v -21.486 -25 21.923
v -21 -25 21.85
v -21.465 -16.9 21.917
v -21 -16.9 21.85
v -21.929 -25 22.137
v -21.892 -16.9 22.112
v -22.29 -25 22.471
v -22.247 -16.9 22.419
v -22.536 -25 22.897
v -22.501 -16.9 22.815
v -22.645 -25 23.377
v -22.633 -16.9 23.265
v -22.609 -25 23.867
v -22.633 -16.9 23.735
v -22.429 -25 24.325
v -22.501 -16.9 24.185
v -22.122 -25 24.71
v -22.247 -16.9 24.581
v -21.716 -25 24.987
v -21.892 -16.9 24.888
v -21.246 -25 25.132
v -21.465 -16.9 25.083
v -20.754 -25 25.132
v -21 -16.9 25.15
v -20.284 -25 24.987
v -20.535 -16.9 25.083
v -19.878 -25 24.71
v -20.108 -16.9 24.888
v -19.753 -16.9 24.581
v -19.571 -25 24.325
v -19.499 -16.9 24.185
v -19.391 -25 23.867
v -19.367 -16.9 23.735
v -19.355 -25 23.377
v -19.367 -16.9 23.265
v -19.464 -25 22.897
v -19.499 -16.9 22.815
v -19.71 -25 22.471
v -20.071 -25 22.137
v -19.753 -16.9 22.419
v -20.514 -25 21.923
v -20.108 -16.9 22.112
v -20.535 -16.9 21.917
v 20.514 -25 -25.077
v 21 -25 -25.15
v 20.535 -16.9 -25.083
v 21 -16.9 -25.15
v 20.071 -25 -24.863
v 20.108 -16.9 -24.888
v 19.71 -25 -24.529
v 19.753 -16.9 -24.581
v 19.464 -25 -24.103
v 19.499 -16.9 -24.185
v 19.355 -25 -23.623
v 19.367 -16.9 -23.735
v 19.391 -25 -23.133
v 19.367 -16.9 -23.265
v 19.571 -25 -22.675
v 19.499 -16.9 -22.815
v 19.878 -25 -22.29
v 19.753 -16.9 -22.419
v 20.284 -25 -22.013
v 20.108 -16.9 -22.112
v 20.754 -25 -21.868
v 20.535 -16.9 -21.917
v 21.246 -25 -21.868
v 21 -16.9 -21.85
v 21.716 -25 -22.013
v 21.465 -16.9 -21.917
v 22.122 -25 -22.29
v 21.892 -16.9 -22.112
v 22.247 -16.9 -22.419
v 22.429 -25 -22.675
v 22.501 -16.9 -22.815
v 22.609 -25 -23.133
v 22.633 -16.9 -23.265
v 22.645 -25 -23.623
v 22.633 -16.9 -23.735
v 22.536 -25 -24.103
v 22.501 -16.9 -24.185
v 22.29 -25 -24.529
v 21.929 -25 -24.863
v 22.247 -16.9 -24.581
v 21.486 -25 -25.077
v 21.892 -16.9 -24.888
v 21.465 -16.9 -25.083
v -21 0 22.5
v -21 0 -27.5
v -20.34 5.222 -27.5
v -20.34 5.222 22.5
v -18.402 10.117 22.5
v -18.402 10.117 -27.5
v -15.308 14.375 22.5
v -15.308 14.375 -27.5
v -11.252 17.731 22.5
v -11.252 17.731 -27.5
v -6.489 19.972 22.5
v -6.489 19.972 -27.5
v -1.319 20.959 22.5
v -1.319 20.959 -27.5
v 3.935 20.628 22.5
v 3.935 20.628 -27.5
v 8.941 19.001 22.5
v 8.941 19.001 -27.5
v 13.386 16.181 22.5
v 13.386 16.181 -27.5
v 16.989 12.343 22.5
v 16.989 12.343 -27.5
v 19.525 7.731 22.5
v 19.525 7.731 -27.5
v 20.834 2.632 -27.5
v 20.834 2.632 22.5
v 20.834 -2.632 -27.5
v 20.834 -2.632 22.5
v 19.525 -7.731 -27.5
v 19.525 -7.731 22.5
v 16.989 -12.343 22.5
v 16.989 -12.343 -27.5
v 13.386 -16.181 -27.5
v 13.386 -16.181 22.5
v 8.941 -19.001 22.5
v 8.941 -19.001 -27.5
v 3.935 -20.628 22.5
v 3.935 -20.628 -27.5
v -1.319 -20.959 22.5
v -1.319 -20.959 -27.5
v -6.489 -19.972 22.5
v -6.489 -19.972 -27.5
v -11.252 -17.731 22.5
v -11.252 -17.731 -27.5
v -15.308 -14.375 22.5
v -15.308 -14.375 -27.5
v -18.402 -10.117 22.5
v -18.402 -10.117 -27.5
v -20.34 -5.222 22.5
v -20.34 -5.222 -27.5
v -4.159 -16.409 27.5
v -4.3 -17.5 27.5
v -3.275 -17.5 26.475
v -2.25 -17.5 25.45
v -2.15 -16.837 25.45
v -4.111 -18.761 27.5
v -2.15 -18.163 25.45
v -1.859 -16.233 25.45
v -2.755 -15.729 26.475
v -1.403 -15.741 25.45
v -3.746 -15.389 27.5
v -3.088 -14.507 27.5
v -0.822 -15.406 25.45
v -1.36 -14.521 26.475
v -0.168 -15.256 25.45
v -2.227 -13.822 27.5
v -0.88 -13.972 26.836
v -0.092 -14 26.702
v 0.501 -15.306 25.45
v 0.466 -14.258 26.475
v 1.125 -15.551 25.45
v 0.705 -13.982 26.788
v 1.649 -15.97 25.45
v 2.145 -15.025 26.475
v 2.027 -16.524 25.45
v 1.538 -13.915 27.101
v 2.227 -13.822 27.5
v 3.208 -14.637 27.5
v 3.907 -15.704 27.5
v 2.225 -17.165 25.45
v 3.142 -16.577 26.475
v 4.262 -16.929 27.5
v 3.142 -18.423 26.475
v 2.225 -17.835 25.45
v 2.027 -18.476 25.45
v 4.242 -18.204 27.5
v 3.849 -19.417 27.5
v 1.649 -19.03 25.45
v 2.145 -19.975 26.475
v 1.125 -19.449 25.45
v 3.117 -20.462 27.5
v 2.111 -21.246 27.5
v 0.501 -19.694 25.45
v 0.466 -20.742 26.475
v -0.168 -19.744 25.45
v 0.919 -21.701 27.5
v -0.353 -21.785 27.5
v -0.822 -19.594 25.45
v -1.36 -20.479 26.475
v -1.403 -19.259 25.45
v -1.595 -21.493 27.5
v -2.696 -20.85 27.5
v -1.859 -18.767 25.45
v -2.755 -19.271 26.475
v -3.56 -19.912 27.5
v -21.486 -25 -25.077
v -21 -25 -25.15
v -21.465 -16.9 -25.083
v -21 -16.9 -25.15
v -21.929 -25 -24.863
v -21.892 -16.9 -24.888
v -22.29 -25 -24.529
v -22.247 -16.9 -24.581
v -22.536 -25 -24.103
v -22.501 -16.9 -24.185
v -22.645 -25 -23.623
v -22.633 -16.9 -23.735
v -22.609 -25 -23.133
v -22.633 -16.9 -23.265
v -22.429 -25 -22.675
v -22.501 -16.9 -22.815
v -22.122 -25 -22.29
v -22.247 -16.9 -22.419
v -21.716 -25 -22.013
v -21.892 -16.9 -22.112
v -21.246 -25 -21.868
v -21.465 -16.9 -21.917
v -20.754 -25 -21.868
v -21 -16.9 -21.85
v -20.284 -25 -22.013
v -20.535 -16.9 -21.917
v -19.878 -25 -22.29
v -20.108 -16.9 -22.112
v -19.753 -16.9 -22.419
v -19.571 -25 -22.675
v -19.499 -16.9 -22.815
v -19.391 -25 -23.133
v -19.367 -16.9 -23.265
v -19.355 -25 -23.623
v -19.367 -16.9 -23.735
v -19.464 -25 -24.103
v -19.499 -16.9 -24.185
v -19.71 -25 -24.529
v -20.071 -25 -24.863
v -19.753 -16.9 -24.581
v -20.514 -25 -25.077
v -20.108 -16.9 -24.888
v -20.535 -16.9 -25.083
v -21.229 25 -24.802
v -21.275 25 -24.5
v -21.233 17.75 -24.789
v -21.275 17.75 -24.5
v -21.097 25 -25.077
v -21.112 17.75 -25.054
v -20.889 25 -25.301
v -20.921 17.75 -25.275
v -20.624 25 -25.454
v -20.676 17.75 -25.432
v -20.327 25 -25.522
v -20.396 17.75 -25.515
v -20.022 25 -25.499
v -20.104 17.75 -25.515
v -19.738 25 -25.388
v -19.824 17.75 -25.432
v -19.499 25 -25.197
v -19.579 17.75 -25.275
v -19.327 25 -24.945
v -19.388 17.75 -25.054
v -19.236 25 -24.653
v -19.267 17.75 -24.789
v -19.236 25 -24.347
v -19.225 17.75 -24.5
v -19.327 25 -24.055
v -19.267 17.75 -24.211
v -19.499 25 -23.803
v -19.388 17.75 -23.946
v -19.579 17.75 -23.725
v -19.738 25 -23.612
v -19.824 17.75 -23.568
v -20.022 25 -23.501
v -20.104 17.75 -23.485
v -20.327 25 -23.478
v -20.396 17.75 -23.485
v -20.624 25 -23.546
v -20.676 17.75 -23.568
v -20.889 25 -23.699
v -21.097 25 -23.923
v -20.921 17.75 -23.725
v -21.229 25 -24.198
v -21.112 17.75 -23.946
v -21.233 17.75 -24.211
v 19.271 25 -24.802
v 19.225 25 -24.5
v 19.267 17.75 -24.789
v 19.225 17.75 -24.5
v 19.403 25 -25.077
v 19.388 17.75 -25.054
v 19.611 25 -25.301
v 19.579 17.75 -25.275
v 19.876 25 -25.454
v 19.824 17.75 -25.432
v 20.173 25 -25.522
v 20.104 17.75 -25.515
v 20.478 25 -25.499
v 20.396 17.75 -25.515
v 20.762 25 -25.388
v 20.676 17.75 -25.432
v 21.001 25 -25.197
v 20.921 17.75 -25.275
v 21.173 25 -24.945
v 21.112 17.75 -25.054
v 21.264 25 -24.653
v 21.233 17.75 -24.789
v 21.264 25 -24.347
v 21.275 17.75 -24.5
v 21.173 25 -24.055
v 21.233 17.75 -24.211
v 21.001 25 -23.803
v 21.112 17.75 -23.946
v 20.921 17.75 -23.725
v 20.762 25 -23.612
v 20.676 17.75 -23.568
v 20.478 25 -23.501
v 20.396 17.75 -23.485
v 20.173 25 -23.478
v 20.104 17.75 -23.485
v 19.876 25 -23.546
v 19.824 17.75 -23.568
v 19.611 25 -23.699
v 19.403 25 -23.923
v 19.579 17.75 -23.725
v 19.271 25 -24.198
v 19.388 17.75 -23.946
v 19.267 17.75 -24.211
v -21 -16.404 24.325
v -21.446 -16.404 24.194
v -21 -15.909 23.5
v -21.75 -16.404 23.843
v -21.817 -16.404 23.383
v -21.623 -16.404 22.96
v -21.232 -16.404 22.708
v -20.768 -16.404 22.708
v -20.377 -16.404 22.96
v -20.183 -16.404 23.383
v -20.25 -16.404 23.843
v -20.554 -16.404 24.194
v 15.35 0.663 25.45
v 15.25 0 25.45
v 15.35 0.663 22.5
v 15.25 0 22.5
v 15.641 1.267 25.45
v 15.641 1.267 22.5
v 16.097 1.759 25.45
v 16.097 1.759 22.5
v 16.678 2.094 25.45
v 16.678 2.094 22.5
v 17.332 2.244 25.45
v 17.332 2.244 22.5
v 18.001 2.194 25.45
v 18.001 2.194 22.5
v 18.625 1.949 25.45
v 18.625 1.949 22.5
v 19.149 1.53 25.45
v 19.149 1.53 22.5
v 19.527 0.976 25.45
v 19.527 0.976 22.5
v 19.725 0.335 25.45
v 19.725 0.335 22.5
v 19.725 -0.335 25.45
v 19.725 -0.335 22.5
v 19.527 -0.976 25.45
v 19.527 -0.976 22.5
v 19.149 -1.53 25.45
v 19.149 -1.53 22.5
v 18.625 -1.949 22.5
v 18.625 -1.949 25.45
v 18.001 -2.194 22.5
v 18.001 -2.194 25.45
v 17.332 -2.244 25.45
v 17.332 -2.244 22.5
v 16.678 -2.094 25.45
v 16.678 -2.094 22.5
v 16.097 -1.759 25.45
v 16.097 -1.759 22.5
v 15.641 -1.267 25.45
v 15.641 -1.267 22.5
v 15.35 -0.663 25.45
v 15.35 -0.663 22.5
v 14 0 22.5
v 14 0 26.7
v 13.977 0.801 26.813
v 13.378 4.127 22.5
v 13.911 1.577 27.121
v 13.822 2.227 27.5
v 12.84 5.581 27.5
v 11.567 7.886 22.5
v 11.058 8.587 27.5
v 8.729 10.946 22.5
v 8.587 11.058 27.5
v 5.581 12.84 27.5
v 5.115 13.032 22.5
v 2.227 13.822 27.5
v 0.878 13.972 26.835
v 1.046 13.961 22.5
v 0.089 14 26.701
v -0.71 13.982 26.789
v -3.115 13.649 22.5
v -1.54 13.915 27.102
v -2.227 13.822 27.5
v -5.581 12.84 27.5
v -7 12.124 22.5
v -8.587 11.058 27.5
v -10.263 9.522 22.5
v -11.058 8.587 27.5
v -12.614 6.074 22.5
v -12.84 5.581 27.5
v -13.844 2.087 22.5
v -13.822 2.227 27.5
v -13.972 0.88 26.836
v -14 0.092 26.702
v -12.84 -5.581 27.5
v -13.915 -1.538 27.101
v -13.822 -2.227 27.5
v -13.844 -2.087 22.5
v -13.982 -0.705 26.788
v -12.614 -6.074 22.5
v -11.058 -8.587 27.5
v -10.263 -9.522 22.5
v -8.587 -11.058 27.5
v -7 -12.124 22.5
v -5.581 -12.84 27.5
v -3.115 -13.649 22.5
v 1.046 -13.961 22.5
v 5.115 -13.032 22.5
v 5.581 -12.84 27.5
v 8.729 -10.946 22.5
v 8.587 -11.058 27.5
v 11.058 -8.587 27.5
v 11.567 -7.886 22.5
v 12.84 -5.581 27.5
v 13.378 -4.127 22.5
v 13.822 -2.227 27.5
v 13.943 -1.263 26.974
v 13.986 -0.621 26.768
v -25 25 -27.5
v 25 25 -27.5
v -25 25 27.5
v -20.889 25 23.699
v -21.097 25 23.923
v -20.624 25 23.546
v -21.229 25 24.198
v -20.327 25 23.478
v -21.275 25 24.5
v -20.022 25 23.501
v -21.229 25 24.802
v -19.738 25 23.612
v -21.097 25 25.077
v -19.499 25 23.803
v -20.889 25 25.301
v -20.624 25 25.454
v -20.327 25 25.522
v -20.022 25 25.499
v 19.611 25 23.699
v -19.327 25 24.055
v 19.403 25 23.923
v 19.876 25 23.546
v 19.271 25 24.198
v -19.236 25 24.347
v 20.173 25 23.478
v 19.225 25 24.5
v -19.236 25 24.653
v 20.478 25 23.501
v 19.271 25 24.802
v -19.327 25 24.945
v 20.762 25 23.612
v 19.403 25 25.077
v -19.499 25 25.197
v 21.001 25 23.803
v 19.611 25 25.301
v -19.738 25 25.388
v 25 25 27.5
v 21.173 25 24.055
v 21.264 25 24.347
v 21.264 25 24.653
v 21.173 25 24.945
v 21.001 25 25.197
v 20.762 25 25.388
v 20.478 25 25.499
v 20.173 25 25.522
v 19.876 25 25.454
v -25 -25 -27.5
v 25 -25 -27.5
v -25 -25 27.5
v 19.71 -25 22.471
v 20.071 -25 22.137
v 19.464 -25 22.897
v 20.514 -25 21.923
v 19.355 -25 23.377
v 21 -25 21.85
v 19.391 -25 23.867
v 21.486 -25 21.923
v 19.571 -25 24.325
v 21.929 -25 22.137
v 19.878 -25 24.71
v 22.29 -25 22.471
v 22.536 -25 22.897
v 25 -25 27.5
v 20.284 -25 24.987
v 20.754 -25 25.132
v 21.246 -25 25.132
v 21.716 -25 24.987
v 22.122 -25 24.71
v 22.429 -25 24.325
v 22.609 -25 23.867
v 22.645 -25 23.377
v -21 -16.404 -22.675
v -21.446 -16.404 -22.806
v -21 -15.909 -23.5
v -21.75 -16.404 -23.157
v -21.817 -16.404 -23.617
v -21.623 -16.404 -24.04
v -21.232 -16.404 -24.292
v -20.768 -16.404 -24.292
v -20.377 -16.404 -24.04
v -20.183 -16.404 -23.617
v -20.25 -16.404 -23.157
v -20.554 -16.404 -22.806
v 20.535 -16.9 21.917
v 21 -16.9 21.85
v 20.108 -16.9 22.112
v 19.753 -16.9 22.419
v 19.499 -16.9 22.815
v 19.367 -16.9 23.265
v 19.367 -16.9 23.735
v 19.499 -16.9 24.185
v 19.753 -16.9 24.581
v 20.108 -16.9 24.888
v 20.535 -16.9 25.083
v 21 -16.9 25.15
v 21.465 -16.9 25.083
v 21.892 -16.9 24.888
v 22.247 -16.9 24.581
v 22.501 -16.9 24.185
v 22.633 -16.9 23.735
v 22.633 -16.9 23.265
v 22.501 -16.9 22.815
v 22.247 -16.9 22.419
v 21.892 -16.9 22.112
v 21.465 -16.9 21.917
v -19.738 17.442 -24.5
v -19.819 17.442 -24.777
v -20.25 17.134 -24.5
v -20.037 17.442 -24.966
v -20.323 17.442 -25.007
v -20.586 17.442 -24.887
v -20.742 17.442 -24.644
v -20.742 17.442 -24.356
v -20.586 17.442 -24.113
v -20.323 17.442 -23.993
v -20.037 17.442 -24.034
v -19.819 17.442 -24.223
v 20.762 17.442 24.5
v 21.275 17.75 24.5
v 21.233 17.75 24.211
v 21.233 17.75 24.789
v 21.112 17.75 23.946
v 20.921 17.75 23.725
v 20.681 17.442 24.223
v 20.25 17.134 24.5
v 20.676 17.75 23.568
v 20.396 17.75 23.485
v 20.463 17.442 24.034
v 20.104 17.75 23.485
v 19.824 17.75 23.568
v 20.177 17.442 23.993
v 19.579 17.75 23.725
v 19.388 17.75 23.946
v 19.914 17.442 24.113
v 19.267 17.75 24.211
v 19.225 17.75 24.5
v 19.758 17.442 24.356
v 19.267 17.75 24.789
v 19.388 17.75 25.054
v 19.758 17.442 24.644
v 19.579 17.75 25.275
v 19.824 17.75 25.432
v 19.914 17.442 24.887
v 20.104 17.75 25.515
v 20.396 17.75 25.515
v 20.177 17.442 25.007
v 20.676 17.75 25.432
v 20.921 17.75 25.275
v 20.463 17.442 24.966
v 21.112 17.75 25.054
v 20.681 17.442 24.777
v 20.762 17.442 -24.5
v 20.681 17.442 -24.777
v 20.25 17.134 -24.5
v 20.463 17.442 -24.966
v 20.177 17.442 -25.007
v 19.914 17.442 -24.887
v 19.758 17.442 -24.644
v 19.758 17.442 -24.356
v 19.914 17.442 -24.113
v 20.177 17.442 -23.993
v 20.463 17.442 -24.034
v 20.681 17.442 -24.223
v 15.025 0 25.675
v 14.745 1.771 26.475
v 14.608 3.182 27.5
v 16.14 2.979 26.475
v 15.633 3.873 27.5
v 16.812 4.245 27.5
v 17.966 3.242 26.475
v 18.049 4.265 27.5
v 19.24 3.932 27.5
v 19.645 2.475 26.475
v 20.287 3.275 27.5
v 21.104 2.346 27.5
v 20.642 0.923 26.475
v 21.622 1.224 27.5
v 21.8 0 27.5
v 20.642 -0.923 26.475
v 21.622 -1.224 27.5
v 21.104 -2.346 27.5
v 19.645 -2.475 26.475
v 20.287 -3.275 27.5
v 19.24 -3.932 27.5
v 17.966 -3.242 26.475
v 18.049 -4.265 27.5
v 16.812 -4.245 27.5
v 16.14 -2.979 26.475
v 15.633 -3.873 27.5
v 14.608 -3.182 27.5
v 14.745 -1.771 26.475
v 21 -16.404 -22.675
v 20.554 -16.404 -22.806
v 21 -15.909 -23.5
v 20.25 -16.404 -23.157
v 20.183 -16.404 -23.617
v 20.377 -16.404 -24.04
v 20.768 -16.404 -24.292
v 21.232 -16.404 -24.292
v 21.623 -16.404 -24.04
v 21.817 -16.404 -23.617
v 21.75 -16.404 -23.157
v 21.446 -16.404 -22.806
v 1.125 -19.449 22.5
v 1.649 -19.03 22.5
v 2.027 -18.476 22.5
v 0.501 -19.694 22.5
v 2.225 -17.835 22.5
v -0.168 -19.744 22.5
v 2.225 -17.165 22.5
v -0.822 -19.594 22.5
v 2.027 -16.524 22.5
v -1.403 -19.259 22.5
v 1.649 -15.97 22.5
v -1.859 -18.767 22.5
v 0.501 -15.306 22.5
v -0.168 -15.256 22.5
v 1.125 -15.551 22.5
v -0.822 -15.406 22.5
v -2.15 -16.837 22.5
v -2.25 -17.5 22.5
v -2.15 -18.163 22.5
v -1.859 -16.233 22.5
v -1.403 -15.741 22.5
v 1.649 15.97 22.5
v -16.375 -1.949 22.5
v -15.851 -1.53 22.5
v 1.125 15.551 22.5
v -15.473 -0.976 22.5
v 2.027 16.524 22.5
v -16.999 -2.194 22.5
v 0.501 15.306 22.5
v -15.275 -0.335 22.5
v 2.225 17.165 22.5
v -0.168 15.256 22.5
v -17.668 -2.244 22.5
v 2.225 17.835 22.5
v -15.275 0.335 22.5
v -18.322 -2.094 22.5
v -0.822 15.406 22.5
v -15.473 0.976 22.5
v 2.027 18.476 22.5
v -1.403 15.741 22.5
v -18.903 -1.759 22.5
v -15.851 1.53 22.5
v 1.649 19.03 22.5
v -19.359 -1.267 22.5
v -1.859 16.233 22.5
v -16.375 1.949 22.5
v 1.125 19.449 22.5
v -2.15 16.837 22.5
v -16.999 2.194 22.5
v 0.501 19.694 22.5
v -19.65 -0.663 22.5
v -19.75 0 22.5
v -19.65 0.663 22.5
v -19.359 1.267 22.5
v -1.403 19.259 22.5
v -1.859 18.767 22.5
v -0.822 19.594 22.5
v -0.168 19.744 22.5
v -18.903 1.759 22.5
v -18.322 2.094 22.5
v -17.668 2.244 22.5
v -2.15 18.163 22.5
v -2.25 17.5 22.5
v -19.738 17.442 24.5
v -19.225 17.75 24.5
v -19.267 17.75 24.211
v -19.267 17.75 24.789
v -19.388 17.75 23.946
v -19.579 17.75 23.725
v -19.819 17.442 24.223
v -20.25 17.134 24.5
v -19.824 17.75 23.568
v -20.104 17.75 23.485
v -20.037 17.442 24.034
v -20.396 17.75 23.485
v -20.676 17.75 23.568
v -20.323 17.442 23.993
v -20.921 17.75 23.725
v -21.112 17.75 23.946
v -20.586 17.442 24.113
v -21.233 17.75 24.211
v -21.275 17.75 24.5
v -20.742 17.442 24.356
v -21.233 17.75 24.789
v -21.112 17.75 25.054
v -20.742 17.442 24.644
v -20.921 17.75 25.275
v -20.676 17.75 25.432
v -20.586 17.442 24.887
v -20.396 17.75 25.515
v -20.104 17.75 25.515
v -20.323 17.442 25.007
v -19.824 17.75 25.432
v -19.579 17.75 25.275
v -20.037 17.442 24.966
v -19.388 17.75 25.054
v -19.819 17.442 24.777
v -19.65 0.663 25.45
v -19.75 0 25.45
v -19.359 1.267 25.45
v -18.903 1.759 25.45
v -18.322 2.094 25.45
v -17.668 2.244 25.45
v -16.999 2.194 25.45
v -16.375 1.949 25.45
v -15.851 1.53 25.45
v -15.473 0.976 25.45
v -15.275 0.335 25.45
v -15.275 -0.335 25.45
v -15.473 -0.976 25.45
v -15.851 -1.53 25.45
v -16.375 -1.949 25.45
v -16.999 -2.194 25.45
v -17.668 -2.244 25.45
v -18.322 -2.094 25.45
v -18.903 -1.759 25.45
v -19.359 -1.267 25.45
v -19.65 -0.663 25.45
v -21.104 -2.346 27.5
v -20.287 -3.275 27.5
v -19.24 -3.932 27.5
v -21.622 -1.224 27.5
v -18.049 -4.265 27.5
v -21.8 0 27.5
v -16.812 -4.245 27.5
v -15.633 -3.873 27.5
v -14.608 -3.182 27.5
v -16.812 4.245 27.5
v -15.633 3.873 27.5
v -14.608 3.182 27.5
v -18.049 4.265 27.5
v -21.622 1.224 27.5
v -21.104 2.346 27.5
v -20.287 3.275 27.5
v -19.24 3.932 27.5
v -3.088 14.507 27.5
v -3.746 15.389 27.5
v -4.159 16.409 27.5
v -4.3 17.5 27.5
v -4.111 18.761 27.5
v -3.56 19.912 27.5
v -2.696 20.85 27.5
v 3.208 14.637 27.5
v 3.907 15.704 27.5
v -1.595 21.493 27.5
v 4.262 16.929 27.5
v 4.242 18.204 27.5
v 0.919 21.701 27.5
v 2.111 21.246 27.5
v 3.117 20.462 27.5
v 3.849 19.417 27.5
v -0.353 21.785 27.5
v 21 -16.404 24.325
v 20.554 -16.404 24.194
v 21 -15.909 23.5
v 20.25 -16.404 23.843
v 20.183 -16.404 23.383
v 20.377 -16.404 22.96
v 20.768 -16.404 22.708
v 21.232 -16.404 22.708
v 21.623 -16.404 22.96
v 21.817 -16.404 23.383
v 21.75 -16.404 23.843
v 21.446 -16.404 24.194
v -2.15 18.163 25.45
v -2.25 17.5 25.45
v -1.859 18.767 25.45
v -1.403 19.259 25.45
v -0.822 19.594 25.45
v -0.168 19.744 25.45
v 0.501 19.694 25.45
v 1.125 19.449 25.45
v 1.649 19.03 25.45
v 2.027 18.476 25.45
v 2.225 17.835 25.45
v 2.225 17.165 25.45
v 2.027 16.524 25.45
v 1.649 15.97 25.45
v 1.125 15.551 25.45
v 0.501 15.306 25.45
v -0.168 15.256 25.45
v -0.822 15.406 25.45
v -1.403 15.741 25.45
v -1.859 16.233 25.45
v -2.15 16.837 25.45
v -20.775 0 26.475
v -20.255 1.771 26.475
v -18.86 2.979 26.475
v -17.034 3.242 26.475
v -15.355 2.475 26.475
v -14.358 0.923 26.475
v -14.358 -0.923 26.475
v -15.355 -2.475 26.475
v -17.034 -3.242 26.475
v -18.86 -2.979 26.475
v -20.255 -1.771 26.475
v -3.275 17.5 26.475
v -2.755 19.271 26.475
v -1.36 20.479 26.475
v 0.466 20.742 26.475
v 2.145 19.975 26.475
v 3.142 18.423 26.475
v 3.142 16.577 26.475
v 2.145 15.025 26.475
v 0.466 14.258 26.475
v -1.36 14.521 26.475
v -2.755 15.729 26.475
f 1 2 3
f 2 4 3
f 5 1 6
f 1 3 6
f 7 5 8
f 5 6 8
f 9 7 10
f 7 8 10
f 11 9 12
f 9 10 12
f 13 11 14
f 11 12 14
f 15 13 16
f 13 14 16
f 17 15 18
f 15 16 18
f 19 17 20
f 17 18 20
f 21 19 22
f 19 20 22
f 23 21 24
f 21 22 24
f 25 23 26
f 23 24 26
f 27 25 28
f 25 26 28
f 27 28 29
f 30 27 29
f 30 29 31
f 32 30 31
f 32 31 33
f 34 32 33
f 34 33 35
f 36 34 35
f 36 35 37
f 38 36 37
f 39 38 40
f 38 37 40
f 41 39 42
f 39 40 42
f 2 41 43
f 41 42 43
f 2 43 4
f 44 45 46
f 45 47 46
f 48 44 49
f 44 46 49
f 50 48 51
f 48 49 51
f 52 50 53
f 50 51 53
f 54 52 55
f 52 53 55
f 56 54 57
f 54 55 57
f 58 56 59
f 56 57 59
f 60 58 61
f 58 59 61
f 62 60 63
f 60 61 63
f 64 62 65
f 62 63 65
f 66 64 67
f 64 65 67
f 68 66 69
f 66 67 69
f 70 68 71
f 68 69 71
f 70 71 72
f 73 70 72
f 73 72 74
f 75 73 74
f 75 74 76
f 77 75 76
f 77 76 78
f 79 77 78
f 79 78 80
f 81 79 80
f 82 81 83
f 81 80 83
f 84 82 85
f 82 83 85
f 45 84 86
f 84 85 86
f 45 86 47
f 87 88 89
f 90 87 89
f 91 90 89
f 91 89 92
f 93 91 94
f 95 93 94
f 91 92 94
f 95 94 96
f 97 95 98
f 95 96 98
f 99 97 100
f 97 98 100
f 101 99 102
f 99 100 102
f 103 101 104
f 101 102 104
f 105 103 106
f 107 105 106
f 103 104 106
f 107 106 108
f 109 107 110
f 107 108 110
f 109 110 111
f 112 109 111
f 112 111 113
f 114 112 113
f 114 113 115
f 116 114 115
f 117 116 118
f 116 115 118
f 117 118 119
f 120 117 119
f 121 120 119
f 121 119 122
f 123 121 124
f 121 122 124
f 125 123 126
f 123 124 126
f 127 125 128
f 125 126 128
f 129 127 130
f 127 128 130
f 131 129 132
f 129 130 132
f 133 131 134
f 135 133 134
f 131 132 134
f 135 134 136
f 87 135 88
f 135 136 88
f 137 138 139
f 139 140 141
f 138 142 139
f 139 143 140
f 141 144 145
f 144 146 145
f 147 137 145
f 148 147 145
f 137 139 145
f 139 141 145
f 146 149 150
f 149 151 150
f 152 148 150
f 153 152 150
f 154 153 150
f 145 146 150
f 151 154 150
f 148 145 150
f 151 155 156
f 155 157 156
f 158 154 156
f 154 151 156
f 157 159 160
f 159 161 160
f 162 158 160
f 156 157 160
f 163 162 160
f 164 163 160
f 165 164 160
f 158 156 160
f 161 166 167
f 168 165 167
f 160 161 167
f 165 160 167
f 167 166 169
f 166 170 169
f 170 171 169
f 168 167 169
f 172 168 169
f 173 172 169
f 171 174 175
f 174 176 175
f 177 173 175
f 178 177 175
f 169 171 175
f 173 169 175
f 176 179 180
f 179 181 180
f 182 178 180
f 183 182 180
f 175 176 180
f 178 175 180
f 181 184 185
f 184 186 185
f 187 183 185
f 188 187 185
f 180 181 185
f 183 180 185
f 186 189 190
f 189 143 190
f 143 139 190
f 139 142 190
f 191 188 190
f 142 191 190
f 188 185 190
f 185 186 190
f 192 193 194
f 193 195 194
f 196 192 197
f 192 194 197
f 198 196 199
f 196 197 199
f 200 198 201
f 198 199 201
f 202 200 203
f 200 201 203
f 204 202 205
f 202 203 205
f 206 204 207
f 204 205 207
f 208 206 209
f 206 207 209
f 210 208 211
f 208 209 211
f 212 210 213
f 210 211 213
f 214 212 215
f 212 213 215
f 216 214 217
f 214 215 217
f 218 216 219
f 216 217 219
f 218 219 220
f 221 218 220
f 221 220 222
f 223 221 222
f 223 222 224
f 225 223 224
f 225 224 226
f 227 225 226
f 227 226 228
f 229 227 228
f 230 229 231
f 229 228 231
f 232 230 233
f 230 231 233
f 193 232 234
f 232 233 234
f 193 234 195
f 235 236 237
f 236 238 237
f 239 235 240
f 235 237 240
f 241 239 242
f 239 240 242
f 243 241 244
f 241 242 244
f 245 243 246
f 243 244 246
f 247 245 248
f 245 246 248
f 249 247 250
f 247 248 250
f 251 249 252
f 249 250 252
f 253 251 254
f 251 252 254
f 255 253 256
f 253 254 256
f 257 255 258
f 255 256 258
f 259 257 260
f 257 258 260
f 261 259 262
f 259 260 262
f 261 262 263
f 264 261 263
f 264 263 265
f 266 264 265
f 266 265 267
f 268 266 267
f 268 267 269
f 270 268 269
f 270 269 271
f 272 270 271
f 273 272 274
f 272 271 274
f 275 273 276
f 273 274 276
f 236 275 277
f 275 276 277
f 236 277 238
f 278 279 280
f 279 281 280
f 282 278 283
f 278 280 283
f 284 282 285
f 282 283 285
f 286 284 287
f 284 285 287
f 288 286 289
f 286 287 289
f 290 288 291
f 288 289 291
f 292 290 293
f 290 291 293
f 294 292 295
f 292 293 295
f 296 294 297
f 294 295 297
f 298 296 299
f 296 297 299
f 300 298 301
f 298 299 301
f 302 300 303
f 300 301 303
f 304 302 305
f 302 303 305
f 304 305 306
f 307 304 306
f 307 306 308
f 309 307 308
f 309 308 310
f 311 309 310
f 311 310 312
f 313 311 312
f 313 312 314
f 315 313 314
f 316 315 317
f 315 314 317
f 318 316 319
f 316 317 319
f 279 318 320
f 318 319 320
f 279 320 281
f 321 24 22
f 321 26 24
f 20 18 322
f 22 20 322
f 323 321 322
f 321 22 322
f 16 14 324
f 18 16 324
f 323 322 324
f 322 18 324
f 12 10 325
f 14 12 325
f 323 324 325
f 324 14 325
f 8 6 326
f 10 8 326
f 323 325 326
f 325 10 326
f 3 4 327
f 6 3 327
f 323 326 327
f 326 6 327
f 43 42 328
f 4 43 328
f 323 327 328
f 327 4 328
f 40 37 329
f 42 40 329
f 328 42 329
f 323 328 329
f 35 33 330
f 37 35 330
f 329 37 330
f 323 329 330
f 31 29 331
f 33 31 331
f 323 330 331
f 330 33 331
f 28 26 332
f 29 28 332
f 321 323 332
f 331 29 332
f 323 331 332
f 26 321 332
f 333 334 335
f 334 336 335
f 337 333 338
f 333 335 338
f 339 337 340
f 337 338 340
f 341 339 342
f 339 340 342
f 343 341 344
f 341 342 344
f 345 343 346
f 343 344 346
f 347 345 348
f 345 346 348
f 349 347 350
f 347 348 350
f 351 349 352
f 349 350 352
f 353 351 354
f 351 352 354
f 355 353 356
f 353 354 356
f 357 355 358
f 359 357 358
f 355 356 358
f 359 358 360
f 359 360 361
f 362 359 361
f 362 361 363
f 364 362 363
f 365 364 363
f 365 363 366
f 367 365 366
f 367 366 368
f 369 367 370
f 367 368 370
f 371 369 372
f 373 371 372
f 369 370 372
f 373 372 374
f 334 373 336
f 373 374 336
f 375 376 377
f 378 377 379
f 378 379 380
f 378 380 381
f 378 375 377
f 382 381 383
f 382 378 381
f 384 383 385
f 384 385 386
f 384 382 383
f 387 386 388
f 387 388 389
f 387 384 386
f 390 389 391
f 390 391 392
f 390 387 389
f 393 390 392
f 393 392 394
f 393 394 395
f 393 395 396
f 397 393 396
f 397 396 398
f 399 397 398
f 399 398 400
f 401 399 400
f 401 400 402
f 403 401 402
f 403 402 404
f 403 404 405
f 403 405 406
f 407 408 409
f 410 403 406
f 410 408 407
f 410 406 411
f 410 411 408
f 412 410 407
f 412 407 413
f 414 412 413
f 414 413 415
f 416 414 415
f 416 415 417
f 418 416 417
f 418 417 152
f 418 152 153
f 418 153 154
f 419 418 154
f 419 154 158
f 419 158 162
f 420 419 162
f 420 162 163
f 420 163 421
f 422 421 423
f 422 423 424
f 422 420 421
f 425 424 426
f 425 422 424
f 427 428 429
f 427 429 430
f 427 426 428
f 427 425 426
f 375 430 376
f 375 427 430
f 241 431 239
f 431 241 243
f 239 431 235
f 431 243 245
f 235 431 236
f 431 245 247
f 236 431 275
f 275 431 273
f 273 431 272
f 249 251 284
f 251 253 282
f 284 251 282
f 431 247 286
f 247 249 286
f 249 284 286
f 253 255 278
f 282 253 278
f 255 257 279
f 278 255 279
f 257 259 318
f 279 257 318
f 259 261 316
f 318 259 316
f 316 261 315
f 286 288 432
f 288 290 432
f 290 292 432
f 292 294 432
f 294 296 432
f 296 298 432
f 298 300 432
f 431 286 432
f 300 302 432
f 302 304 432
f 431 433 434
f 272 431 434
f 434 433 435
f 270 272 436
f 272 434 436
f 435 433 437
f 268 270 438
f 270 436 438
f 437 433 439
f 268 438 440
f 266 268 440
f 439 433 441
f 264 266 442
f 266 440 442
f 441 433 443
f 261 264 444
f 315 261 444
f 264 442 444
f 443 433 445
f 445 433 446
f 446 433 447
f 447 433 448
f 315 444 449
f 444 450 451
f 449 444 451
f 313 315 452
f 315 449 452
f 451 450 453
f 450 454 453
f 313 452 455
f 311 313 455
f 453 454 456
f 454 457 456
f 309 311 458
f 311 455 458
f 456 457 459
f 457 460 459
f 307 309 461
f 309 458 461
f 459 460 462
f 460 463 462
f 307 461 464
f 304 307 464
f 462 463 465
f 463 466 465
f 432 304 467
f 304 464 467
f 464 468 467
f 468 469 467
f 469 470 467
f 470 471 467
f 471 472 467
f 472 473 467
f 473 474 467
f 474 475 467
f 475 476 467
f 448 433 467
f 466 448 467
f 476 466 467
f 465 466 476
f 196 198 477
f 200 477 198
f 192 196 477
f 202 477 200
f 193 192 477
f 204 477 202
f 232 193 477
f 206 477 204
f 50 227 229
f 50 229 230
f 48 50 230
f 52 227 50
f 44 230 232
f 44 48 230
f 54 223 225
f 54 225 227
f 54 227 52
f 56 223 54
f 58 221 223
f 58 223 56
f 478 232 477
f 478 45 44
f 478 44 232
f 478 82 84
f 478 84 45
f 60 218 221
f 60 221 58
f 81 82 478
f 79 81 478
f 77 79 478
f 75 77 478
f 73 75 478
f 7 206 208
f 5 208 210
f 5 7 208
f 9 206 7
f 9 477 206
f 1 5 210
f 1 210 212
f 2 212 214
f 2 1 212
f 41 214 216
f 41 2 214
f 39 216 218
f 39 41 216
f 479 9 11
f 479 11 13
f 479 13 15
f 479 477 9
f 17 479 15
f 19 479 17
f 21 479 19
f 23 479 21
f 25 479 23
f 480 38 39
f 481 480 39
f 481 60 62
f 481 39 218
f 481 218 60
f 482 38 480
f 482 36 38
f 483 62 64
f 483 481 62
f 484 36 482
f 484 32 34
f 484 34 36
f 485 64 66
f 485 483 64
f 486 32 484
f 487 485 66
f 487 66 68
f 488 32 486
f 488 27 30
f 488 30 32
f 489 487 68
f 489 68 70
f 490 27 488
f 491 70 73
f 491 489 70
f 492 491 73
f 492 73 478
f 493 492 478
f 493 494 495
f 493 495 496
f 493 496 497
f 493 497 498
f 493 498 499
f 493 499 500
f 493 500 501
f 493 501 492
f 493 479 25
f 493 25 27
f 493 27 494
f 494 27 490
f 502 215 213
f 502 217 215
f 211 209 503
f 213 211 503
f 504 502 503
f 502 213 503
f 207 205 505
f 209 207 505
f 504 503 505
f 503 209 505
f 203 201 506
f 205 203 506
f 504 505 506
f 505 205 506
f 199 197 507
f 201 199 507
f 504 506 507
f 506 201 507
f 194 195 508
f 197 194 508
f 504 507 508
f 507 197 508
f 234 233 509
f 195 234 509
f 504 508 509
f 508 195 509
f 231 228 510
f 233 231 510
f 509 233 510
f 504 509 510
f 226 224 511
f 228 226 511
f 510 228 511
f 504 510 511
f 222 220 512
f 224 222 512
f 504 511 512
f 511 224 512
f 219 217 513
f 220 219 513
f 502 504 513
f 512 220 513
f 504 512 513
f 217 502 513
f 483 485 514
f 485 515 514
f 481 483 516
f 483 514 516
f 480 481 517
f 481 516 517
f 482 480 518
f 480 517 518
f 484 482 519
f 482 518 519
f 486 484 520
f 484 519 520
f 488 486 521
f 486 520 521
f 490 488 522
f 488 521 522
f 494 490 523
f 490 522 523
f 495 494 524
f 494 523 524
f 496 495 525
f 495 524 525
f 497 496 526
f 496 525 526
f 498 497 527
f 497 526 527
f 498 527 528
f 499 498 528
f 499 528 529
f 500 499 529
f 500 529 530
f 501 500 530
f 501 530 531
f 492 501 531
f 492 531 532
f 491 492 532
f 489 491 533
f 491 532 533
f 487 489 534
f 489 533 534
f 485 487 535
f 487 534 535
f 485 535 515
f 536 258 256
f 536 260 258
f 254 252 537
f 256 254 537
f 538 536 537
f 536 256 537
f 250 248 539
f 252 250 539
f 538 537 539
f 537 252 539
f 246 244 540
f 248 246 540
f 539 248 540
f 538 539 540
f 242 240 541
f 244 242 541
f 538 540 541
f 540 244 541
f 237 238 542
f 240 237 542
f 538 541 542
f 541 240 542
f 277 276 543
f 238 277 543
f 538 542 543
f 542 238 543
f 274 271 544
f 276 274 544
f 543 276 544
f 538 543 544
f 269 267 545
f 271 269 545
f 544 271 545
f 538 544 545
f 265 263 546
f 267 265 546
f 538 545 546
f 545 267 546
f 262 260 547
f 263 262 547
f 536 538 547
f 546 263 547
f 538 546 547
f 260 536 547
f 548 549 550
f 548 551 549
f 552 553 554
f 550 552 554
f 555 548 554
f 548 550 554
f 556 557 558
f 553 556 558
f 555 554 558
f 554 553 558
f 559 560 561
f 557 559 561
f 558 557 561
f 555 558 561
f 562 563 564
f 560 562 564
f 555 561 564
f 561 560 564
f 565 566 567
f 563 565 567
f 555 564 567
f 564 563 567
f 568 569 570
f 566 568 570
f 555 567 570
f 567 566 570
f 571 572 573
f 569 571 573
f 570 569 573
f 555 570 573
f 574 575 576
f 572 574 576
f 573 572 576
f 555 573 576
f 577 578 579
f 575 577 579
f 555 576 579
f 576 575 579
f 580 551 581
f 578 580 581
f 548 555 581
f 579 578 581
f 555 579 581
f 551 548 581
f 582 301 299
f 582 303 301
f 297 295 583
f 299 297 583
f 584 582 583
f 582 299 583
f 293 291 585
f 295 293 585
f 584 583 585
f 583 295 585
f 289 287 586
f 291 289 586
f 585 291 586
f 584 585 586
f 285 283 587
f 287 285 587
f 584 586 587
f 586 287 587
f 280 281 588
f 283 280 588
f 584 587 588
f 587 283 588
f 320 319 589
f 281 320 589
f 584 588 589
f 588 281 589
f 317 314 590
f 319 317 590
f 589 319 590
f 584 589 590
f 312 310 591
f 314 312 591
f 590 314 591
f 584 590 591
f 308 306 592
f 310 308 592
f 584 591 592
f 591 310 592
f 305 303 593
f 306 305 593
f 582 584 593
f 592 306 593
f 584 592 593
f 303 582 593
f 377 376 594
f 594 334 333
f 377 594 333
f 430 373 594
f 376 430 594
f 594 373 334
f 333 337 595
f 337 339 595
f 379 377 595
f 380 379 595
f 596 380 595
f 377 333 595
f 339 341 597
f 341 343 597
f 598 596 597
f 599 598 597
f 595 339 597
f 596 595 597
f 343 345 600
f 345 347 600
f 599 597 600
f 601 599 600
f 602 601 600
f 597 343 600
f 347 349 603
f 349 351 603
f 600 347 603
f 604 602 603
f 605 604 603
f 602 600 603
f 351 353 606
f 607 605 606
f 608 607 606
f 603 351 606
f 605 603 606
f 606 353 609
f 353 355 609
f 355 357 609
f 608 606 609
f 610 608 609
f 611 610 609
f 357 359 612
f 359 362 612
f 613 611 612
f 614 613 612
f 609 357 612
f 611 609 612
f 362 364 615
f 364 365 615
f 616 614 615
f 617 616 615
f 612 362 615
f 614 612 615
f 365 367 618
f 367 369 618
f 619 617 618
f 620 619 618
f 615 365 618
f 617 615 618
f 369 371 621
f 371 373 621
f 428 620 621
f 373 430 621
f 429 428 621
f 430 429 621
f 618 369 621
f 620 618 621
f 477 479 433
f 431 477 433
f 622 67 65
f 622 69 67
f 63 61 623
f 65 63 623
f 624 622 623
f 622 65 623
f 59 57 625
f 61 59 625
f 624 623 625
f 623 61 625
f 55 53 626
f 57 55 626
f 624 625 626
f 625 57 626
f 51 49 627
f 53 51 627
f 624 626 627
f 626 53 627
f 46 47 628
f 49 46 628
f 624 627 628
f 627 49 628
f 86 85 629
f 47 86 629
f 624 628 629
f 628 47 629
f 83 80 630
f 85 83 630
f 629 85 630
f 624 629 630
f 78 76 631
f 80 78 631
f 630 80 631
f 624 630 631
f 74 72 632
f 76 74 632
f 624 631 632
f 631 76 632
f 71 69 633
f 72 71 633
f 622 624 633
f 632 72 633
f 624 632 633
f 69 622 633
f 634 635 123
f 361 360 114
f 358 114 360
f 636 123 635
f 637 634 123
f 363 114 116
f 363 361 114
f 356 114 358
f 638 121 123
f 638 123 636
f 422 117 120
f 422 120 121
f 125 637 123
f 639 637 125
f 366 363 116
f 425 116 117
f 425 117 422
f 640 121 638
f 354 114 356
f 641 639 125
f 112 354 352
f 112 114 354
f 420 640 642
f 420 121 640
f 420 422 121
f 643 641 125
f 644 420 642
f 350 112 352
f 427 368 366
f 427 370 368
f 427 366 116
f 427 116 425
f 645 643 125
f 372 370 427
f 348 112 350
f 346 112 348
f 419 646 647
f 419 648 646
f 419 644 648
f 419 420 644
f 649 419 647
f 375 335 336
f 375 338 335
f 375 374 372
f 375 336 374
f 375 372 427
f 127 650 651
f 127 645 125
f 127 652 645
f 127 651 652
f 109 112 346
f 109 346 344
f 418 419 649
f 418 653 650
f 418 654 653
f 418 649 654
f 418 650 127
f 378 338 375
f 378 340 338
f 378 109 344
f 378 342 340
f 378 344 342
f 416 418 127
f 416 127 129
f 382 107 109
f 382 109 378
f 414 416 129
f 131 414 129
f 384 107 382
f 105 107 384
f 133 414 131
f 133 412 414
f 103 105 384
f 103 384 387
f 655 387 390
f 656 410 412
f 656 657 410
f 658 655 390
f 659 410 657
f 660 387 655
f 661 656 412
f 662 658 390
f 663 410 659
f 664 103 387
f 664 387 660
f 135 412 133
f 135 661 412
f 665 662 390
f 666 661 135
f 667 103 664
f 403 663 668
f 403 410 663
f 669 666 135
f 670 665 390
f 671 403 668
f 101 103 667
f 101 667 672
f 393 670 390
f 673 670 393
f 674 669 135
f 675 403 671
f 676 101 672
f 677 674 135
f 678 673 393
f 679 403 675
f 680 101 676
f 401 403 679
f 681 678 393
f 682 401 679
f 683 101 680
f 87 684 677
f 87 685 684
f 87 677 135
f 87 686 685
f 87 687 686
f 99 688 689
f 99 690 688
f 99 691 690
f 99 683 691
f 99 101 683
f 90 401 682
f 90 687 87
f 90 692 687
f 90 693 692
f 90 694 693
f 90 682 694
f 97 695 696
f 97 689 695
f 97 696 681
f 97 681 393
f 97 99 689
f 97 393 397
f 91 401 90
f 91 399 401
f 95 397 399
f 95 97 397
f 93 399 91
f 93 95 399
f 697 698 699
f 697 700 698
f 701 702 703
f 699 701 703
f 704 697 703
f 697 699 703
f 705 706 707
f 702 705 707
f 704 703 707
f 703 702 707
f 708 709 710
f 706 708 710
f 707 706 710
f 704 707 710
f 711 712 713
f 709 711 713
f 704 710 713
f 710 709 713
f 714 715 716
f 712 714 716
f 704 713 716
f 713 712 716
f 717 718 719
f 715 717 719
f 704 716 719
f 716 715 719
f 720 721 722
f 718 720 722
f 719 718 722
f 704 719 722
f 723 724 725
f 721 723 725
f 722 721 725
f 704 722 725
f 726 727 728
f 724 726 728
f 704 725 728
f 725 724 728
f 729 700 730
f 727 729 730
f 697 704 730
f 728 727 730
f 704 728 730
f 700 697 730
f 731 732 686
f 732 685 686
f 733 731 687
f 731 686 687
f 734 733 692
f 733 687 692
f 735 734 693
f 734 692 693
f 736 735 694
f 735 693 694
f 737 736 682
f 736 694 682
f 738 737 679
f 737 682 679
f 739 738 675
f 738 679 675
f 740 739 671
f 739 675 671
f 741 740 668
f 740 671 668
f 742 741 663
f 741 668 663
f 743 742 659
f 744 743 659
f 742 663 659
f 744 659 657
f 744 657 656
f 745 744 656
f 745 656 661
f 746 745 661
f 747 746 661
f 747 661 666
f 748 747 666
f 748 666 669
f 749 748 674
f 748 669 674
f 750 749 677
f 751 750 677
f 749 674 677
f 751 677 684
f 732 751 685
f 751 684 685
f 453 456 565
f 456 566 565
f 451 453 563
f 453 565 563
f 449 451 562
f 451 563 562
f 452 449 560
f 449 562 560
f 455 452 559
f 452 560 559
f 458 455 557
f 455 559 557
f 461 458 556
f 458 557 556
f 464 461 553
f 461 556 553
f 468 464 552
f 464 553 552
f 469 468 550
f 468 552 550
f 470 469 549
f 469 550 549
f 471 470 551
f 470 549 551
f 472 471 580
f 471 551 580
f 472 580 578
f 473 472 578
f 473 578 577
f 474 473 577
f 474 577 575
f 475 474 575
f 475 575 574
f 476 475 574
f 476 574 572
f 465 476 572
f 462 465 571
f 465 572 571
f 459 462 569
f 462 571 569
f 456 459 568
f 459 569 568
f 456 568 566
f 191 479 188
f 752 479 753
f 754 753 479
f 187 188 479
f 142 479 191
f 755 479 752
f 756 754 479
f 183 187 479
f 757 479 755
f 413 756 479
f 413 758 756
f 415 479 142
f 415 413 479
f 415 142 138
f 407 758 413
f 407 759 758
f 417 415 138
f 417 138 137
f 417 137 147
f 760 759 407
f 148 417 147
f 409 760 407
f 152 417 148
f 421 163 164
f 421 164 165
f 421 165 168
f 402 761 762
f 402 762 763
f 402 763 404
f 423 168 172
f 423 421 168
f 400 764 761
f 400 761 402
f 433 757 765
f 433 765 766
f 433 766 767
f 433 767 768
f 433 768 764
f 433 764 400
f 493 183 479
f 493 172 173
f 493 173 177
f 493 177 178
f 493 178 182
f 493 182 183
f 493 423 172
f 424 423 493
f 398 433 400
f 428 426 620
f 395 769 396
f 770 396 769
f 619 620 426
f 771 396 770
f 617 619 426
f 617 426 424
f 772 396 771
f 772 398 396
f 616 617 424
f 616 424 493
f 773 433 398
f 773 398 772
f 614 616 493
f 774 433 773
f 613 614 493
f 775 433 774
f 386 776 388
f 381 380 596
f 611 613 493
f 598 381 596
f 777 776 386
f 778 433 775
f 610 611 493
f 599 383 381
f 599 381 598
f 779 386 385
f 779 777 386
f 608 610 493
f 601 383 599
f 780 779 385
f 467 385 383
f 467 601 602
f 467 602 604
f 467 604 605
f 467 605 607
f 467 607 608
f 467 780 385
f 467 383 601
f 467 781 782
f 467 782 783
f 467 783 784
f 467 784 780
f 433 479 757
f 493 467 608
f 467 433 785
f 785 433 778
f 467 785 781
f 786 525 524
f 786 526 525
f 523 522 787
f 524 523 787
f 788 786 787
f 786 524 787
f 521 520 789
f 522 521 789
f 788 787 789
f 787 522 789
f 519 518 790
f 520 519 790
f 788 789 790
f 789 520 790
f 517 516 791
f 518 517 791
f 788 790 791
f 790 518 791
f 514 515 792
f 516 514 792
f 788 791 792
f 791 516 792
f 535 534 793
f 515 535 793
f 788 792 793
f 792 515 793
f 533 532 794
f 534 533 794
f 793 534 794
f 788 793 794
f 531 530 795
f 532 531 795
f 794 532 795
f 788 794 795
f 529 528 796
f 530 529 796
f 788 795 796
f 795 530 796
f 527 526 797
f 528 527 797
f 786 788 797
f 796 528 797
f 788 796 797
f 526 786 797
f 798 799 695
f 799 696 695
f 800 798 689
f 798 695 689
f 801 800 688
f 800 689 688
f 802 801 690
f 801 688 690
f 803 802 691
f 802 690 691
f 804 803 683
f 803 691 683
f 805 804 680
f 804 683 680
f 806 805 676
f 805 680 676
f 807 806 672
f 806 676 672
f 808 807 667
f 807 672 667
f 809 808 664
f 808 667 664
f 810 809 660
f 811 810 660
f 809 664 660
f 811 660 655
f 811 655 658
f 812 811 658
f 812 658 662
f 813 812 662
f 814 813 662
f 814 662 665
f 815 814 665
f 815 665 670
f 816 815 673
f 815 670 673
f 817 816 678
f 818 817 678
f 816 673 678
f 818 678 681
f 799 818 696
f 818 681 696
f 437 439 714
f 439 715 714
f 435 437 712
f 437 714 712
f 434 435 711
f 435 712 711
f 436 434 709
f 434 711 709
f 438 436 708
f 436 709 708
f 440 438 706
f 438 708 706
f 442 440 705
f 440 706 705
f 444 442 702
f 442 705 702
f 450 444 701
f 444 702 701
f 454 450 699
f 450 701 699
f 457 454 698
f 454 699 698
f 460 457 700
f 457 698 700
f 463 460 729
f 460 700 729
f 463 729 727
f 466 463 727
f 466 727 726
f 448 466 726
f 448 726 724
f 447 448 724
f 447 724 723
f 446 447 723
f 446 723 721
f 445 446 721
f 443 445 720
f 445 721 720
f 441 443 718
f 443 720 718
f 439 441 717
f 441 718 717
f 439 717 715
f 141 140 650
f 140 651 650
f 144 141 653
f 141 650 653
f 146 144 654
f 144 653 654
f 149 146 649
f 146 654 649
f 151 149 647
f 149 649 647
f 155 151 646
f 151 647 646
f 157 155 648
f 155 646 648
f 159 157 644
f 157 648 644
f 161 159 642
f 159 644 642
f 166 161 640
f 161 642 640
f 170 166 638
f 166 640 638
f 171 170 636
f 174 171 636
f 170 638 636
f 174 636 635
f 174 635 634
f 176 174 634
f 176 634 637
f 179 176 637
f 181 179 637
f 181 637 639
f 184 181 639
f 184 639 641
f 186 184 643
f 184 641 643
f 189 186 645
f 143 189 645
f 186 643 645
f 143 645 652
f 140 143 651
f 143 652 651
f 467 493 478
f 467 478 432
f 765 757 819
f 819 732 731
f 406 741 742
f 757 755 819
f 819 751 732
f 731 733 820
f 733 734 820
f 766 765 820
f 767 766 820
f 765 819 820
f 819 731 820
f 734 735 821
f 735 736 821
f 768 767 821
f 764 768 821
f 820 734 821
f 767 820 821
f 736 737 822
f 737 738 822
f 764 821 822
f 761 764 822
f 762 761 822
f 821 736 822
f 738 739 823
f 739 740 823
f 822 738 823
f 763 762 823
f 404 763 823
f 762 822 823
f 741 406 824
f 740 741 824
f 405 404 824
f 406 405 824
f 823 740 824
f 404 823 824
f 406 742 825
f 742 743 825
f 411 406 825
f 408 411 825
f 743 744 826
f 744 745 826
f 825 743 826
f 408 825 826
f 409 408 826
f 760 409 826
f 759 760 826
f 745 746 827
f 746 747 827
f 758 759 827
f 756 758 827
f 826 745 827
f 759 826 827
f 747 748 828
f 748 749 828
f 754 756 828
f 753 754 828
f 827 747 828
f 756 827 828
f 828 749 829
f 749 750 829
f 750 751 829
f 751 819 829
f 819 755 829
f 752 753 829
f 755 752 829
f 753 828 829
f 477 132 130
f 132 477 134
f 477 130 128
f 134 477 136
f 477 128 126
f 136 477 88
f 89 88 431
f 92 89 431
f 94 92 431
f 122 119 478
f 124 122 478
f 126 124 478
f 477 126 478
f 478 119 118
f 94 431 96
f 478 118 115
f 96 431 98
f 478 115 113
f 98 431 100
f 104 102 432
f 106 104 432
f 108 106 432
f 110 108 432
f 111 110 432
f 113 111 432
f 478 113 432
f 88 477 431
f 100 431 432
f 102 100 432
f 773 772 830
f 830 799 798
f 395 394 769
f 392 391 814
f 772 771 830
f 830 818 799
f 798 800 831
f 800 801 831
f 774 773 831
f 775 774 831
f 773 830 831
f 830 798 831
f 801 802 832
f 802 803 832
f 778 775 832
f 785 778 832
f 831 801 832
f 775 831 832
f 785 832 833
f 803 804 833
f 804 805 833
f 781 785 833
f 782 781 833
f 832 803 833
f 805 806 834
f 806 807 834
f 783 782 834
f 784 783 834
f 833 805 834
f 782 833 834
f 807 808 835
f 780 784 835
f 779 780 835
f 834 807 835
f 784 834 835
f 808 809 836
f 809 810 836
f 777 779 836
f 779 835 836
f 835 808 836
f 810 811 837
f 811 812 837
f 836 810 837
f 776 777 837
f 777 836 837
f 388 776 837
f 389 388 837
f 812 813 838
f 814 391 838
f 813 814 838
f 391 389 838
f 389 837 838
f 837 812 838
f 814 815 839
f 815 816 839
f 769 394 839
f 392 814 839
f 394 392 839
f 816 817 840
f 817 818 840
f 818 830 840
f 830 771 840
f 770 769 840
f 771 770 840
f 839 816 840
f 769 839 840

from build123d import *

# Parameters (mm, degrees)
SKETCH_1_W                = 50
SKETCH_1_H                = 50
SKETCH_1_R                = 14
EXTRUDE_2_DEPTH           = 27.5
SKETCH_3_R                = 21
CUT_EXTRUDE_2_DEPTH       = 50
HOLE_WIZARD_M2_5_1_D      = 2.05
HOLE_WIZARD_M2_5_1_DEPTH  = 7.25
HOLE_WIZARD_M2_5_1_TIP    = 0.615882135
HOLE_WIZARD_1_D           = 4.5
HOLE_WIZARD_1_CSINK_D     = 8.6
HOLE_WIZARD_1_CSINK_ANGLE = 90
HOLE_WIZARD_M4_1_D        = 3.3
HOLE_WIZARD_M4_1_DEPTH    = 8.1
HOLE_WIZARD_M4_1_TIP      = 0.991420021


with BuildPart() as part:
    # 草图1 → 凸台-拉伸2 (new, symmetric)
    with BuildSketch(Plane.XY):
        Rectangle(SKETCH_1_W, SKETCH_1_H)
        Circle(SKETCH_1_R, mode=Mode.SUBTRACT)
    extrude(amount=EXTRUDE_2_DEPTH, both=True)

    # 草图3 → 切除-拉伸2 (cut)
    with BuildSketch(Plane(origin=(0, 0, -27.5), x_dir=(-1, 0, 0), z_dir=(0, 0, -1))):
        Circle(SKETCH_3_R)
    extrude(amount=-CUT_EXTRUDE_2_DEPTH, mode=Mode.SUBTRACT)

    # M2.5 螺纹孔1
    with Locations(Plane(origin=(-9.644019955, 25, 9.714634246), x_dir=(1, 0, 0), z_dir=(0, 1, 0))):
        with Locations((29.894019955, 34.214634246), (-10.605980045, -14.785365754), (-10.605980045, 34.214634246), (29.894019955, -14.785365754)):
            Hole(HOLE_WIZARD_M2_5_1_D / 2, depth=HOLE_WIZARD_M2_5_1_DEPTH)
            with Locations((0, 0, -(HOLE_WIZARD_M2_5_1_DEPTH + HOLE_WIZARD_M2_5_1_TIP / 2))):  # 118° drill point
                Cone(0, HOLE_WIZARD_M2_5_1_D / 2, HOLE_WIZARD_M2_5_1_TIP, mode=Mode.SUBTRACT)

    # 打孔尺寸(%根据十字)槽沉头木螺钉的类型1 (through all)
    with Locations(Plane.XY.offset(27.5)):
        with Locations((0, 17.5), (17.5, 0), (0, -17.5), (-17.5, 0)):
            CounterSinkHole(HOLE_WIZARD_1_D / 2, HOLE_WIZARD_1_CSINK_D / 2, counter_sink_angle=HOLE_WIZARD_1_CSINK_ANGLE)

    # M4 螺纹孔1
    with Locations(Plane(origin=(0.5, -25, 0), x_dir=(0, 0, 1), z_dir=(0, -1, 0))):
        with Locations((23.5, 21.5), (-23.5, -20.5), (-23.5, 21.5), (23.5, -20.5)):
            Hole(HOLE_WIZARD_M4_1_D / 2, depth=HOLE_WIZARD_M4_1_DEPTH)
            with Locations((0, 0, -(HOLE_WIZARD_M4_1_DEPTH + HOLE_WIZARD_M4_1_TIP / 2))):  # 118° drill point
                Cone(0, HOLE_WIZARD_M4_1_D / 2, HOLE_WIZARD_M4_1_TIP, mode=Mode.SUBTRACT)


solid = part.part
